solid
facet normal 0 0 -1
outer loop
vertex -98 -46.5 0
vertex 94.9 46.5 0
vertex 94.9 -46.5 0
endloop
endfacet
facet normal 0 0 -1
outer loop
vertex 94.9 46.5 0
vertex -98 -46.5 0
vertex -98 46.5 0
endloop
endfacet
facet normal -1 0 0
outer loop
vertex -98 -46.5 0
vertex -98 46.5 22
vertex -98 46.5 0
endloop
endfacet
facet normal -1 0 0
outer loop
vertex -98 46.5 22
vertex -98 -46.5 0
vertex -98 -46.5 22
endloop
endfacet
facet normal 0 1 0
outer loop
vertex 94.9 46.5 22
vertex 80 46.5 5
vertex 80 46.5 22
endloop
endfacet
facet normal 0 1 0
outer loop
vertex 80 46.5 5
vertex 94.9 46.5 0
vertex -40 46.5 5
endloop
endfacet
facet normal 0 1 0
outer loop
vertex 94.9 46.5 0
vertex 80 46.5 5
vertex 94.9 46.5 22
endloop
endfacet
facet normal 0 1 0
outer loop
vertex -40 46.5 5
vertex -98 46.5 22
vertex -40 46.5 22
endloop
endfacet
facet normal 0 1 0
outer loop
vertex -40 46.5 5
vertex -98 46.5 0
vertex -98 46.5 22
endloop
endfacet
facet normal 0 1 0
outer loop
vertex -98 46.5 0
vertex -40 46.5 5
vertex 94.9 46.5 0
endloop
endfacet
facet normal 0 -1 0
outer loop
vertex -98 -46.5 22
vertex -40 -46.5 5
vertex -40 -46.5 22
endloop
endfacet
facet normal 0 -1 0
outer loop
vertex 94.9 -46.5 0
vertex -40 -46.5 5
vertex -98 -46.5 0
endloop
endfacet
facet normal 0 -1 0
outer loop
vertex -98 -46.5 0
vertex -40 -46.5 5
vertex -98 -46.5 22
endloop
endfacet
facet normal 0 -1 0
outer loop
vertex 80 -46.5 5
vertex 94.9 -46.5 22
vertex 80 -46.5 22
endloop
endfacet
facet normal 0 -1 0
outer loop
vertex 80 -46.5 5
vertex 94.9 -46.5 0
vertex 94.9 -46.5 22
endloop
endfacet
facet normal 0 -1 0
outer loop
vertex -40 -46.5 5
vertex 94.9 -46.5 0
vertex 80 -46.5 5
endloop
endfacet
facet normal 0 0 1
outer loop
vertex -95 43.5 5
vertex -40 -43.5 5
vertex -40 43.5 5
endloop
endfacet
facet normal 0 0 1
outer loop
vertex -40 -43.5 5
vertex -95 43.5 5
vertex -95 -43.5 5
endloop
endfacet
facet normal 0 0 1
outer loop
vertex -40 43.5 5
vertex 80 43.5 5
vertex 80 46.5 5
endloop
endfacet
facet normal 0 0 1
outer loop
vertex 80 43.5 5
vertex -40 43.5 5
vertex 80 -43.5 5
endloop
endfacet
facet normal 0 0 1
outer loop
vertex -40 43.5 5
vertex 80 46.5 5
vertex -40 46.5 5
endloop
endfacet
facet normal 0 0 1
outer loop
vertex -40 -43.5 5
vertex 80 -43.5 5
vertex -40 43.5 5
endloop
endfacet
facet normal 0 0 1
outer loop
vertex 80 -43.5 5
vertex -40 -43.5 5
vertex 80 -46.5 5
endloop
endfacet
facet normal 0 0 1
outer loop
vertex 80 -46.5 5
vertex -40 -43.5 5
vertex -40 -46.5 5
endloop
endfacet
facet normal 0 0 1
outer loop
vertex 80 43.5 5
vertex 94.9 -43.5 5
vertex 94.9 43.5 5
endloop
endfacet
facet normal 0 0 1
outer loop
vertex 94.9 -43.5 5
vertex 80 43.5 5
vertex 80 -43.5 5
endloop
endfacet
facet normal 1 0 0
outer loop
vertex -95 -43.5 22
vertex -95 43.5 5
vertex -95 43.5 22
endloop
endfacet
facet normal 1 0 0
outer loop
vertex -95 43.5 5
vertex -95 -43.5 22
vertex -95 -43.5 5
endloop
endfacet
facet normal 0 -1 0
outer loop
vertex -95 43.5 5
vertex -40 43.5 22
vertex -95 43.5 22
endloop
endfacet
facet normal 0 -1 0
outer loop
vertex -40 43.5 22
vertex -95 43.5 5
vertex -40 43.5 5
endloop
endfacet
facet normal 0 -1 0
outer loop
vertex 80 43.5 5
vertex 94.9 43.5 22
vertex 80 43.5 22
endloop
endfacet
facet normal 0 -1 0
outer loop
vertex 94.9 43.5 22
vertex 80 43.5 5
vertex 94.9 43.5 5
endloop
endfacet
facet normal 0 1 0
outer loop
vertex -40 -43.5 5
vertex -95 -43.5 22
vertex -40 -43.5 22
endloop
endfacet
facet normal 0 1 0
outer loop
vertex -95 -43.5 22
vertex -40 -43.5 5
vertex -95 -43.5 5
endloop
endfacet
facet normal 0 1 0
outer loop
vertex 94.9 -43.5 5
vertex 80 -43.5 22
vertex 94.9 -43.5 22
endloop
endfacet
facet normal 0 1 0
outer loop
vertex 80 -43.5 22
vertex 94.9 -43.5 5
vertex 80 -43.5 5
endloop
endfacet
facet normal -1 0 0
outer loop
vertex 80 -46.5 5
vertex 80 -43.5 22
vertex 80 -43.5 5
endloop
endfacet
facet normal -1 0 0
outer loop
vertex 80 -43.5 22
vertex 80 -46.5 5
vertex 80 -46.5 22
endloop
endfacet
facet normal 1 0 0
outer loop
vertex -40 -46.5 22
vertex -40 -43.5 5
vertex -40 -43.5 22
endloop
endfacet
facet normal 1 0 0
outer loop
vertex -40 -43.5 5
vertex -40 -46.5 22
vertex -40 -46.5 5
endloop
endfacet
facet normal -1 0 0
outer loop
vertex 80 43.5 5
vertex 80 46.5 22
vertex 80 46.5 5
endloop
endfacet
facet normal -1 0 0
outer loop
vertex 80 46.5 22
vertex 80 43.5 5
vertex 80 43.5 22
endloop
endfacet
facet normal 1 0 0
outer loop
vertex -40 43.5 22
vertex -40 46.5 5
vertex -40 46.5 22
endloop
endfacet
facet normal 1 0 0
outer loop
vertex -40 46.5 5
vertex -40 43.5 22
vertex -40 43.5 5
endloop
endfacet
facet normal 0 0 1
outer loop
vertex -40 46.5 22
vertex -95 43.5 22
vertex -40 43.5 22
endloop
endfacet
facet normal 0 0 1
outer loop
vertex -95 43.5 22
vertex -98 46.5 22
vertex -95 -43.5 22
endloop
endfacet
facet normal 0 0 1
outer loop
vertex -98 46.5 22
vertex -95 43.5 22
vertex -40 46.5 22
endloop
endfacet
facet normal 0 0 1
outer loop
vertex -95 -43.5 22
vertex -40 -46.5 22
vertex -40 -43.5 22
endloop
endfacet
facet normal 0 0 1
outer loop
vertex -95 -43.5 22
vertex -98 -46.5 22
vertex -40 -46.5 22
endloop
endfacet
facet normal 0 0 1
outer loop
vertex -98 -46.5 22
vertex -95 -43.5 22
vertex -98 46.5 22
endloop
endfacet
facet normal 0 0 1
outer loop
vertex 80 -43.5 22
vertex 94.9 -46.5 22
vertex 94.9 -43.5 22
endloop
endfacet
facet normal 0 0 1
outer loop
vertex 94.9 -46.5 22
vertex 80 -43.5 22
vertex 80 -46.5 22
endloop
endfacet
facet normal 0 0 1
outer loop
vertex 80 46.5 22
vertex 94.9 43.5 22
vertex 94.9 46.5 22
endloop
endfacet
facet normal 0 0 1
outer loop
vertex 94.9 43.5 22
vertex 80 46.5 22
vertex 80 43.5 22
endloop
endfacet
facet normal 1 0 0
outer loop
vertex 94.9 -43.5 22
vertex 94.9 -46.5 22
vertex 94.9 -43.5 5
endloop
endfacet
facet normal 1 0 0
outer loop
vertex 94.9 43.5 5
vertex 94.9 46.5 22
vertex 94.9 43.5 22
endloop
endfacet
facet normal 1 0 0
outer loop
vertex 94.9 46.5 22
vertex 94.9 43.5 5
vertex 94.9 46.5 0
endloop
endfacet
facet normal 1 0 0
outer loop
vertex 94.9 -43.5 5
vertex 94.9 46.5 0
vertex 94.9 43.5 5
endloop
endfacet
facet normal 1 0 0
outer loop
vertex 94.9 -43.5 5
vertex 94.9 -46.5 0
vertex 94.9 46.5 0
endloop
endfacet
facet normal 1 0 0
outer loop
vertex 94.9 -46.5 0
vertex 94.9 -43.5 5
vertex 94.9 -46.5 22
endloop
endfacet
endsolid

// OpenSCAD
// =======================================
// Caja sin tapa ni pared lateral derecha
// =======================================

largo_interno = 190;   // mm
ancho_interno = 87;    // mm
alto_interno  = 20;    // mm

pared = 3;             // espesor paredes laterales
base_espesor = 5;      // espesor base

// Dimensiones externas calculadas
largo = largo_interno + 2*pared;       // 196 mm
ancho = ancho_interno + 2*pared;       // 93 mm
alto  = alto_interno + base_espesor;   // 25 mm

ranura_largo = 120;
ranura_alto = 20;

module caja_sin_tapa_y_lado_derecho(l, a, h, t, base_t) {

difference() {

    // Caja exterior completa
    translate([-l/2, -a/2, 0])
        cube([l, a, h]);

    // Hueco interior
    translate([-l/2 + t, -a/2 + t, base_t])
        cube([l - 2*t, a - 2*t, h - base_t]);

    // Ranura frontal
    translate([-40, -a/2 - 0.1, h - ranura_alto])
        cube([ranura_largo, t + 0.2, ranura_alto]);

    // Ranura trasera
    translate([-40, a/2 - t - 0.1, h - ranura_alto])
        cube([ranura_largo, t + 0.2, ranura_alto]);

    // Eliminar tapa superior
    translate([-l/2 - 0.1, -a/2 - 0.1, h - t])
        cube([l + 0.2, a + 0.2, t + 0.2]);

    // Eliminar pared lateral derecha
    translate([l/2 - t - 0.1, -a/2 - 0.1, -0.1])
        cube([t + 0.2, a + 0.2, h]);
}
        
}
// Llamada principal
caja_sin_tapa_y_lado_derecho(largo, ancho, alto, pared, base_espesor);
